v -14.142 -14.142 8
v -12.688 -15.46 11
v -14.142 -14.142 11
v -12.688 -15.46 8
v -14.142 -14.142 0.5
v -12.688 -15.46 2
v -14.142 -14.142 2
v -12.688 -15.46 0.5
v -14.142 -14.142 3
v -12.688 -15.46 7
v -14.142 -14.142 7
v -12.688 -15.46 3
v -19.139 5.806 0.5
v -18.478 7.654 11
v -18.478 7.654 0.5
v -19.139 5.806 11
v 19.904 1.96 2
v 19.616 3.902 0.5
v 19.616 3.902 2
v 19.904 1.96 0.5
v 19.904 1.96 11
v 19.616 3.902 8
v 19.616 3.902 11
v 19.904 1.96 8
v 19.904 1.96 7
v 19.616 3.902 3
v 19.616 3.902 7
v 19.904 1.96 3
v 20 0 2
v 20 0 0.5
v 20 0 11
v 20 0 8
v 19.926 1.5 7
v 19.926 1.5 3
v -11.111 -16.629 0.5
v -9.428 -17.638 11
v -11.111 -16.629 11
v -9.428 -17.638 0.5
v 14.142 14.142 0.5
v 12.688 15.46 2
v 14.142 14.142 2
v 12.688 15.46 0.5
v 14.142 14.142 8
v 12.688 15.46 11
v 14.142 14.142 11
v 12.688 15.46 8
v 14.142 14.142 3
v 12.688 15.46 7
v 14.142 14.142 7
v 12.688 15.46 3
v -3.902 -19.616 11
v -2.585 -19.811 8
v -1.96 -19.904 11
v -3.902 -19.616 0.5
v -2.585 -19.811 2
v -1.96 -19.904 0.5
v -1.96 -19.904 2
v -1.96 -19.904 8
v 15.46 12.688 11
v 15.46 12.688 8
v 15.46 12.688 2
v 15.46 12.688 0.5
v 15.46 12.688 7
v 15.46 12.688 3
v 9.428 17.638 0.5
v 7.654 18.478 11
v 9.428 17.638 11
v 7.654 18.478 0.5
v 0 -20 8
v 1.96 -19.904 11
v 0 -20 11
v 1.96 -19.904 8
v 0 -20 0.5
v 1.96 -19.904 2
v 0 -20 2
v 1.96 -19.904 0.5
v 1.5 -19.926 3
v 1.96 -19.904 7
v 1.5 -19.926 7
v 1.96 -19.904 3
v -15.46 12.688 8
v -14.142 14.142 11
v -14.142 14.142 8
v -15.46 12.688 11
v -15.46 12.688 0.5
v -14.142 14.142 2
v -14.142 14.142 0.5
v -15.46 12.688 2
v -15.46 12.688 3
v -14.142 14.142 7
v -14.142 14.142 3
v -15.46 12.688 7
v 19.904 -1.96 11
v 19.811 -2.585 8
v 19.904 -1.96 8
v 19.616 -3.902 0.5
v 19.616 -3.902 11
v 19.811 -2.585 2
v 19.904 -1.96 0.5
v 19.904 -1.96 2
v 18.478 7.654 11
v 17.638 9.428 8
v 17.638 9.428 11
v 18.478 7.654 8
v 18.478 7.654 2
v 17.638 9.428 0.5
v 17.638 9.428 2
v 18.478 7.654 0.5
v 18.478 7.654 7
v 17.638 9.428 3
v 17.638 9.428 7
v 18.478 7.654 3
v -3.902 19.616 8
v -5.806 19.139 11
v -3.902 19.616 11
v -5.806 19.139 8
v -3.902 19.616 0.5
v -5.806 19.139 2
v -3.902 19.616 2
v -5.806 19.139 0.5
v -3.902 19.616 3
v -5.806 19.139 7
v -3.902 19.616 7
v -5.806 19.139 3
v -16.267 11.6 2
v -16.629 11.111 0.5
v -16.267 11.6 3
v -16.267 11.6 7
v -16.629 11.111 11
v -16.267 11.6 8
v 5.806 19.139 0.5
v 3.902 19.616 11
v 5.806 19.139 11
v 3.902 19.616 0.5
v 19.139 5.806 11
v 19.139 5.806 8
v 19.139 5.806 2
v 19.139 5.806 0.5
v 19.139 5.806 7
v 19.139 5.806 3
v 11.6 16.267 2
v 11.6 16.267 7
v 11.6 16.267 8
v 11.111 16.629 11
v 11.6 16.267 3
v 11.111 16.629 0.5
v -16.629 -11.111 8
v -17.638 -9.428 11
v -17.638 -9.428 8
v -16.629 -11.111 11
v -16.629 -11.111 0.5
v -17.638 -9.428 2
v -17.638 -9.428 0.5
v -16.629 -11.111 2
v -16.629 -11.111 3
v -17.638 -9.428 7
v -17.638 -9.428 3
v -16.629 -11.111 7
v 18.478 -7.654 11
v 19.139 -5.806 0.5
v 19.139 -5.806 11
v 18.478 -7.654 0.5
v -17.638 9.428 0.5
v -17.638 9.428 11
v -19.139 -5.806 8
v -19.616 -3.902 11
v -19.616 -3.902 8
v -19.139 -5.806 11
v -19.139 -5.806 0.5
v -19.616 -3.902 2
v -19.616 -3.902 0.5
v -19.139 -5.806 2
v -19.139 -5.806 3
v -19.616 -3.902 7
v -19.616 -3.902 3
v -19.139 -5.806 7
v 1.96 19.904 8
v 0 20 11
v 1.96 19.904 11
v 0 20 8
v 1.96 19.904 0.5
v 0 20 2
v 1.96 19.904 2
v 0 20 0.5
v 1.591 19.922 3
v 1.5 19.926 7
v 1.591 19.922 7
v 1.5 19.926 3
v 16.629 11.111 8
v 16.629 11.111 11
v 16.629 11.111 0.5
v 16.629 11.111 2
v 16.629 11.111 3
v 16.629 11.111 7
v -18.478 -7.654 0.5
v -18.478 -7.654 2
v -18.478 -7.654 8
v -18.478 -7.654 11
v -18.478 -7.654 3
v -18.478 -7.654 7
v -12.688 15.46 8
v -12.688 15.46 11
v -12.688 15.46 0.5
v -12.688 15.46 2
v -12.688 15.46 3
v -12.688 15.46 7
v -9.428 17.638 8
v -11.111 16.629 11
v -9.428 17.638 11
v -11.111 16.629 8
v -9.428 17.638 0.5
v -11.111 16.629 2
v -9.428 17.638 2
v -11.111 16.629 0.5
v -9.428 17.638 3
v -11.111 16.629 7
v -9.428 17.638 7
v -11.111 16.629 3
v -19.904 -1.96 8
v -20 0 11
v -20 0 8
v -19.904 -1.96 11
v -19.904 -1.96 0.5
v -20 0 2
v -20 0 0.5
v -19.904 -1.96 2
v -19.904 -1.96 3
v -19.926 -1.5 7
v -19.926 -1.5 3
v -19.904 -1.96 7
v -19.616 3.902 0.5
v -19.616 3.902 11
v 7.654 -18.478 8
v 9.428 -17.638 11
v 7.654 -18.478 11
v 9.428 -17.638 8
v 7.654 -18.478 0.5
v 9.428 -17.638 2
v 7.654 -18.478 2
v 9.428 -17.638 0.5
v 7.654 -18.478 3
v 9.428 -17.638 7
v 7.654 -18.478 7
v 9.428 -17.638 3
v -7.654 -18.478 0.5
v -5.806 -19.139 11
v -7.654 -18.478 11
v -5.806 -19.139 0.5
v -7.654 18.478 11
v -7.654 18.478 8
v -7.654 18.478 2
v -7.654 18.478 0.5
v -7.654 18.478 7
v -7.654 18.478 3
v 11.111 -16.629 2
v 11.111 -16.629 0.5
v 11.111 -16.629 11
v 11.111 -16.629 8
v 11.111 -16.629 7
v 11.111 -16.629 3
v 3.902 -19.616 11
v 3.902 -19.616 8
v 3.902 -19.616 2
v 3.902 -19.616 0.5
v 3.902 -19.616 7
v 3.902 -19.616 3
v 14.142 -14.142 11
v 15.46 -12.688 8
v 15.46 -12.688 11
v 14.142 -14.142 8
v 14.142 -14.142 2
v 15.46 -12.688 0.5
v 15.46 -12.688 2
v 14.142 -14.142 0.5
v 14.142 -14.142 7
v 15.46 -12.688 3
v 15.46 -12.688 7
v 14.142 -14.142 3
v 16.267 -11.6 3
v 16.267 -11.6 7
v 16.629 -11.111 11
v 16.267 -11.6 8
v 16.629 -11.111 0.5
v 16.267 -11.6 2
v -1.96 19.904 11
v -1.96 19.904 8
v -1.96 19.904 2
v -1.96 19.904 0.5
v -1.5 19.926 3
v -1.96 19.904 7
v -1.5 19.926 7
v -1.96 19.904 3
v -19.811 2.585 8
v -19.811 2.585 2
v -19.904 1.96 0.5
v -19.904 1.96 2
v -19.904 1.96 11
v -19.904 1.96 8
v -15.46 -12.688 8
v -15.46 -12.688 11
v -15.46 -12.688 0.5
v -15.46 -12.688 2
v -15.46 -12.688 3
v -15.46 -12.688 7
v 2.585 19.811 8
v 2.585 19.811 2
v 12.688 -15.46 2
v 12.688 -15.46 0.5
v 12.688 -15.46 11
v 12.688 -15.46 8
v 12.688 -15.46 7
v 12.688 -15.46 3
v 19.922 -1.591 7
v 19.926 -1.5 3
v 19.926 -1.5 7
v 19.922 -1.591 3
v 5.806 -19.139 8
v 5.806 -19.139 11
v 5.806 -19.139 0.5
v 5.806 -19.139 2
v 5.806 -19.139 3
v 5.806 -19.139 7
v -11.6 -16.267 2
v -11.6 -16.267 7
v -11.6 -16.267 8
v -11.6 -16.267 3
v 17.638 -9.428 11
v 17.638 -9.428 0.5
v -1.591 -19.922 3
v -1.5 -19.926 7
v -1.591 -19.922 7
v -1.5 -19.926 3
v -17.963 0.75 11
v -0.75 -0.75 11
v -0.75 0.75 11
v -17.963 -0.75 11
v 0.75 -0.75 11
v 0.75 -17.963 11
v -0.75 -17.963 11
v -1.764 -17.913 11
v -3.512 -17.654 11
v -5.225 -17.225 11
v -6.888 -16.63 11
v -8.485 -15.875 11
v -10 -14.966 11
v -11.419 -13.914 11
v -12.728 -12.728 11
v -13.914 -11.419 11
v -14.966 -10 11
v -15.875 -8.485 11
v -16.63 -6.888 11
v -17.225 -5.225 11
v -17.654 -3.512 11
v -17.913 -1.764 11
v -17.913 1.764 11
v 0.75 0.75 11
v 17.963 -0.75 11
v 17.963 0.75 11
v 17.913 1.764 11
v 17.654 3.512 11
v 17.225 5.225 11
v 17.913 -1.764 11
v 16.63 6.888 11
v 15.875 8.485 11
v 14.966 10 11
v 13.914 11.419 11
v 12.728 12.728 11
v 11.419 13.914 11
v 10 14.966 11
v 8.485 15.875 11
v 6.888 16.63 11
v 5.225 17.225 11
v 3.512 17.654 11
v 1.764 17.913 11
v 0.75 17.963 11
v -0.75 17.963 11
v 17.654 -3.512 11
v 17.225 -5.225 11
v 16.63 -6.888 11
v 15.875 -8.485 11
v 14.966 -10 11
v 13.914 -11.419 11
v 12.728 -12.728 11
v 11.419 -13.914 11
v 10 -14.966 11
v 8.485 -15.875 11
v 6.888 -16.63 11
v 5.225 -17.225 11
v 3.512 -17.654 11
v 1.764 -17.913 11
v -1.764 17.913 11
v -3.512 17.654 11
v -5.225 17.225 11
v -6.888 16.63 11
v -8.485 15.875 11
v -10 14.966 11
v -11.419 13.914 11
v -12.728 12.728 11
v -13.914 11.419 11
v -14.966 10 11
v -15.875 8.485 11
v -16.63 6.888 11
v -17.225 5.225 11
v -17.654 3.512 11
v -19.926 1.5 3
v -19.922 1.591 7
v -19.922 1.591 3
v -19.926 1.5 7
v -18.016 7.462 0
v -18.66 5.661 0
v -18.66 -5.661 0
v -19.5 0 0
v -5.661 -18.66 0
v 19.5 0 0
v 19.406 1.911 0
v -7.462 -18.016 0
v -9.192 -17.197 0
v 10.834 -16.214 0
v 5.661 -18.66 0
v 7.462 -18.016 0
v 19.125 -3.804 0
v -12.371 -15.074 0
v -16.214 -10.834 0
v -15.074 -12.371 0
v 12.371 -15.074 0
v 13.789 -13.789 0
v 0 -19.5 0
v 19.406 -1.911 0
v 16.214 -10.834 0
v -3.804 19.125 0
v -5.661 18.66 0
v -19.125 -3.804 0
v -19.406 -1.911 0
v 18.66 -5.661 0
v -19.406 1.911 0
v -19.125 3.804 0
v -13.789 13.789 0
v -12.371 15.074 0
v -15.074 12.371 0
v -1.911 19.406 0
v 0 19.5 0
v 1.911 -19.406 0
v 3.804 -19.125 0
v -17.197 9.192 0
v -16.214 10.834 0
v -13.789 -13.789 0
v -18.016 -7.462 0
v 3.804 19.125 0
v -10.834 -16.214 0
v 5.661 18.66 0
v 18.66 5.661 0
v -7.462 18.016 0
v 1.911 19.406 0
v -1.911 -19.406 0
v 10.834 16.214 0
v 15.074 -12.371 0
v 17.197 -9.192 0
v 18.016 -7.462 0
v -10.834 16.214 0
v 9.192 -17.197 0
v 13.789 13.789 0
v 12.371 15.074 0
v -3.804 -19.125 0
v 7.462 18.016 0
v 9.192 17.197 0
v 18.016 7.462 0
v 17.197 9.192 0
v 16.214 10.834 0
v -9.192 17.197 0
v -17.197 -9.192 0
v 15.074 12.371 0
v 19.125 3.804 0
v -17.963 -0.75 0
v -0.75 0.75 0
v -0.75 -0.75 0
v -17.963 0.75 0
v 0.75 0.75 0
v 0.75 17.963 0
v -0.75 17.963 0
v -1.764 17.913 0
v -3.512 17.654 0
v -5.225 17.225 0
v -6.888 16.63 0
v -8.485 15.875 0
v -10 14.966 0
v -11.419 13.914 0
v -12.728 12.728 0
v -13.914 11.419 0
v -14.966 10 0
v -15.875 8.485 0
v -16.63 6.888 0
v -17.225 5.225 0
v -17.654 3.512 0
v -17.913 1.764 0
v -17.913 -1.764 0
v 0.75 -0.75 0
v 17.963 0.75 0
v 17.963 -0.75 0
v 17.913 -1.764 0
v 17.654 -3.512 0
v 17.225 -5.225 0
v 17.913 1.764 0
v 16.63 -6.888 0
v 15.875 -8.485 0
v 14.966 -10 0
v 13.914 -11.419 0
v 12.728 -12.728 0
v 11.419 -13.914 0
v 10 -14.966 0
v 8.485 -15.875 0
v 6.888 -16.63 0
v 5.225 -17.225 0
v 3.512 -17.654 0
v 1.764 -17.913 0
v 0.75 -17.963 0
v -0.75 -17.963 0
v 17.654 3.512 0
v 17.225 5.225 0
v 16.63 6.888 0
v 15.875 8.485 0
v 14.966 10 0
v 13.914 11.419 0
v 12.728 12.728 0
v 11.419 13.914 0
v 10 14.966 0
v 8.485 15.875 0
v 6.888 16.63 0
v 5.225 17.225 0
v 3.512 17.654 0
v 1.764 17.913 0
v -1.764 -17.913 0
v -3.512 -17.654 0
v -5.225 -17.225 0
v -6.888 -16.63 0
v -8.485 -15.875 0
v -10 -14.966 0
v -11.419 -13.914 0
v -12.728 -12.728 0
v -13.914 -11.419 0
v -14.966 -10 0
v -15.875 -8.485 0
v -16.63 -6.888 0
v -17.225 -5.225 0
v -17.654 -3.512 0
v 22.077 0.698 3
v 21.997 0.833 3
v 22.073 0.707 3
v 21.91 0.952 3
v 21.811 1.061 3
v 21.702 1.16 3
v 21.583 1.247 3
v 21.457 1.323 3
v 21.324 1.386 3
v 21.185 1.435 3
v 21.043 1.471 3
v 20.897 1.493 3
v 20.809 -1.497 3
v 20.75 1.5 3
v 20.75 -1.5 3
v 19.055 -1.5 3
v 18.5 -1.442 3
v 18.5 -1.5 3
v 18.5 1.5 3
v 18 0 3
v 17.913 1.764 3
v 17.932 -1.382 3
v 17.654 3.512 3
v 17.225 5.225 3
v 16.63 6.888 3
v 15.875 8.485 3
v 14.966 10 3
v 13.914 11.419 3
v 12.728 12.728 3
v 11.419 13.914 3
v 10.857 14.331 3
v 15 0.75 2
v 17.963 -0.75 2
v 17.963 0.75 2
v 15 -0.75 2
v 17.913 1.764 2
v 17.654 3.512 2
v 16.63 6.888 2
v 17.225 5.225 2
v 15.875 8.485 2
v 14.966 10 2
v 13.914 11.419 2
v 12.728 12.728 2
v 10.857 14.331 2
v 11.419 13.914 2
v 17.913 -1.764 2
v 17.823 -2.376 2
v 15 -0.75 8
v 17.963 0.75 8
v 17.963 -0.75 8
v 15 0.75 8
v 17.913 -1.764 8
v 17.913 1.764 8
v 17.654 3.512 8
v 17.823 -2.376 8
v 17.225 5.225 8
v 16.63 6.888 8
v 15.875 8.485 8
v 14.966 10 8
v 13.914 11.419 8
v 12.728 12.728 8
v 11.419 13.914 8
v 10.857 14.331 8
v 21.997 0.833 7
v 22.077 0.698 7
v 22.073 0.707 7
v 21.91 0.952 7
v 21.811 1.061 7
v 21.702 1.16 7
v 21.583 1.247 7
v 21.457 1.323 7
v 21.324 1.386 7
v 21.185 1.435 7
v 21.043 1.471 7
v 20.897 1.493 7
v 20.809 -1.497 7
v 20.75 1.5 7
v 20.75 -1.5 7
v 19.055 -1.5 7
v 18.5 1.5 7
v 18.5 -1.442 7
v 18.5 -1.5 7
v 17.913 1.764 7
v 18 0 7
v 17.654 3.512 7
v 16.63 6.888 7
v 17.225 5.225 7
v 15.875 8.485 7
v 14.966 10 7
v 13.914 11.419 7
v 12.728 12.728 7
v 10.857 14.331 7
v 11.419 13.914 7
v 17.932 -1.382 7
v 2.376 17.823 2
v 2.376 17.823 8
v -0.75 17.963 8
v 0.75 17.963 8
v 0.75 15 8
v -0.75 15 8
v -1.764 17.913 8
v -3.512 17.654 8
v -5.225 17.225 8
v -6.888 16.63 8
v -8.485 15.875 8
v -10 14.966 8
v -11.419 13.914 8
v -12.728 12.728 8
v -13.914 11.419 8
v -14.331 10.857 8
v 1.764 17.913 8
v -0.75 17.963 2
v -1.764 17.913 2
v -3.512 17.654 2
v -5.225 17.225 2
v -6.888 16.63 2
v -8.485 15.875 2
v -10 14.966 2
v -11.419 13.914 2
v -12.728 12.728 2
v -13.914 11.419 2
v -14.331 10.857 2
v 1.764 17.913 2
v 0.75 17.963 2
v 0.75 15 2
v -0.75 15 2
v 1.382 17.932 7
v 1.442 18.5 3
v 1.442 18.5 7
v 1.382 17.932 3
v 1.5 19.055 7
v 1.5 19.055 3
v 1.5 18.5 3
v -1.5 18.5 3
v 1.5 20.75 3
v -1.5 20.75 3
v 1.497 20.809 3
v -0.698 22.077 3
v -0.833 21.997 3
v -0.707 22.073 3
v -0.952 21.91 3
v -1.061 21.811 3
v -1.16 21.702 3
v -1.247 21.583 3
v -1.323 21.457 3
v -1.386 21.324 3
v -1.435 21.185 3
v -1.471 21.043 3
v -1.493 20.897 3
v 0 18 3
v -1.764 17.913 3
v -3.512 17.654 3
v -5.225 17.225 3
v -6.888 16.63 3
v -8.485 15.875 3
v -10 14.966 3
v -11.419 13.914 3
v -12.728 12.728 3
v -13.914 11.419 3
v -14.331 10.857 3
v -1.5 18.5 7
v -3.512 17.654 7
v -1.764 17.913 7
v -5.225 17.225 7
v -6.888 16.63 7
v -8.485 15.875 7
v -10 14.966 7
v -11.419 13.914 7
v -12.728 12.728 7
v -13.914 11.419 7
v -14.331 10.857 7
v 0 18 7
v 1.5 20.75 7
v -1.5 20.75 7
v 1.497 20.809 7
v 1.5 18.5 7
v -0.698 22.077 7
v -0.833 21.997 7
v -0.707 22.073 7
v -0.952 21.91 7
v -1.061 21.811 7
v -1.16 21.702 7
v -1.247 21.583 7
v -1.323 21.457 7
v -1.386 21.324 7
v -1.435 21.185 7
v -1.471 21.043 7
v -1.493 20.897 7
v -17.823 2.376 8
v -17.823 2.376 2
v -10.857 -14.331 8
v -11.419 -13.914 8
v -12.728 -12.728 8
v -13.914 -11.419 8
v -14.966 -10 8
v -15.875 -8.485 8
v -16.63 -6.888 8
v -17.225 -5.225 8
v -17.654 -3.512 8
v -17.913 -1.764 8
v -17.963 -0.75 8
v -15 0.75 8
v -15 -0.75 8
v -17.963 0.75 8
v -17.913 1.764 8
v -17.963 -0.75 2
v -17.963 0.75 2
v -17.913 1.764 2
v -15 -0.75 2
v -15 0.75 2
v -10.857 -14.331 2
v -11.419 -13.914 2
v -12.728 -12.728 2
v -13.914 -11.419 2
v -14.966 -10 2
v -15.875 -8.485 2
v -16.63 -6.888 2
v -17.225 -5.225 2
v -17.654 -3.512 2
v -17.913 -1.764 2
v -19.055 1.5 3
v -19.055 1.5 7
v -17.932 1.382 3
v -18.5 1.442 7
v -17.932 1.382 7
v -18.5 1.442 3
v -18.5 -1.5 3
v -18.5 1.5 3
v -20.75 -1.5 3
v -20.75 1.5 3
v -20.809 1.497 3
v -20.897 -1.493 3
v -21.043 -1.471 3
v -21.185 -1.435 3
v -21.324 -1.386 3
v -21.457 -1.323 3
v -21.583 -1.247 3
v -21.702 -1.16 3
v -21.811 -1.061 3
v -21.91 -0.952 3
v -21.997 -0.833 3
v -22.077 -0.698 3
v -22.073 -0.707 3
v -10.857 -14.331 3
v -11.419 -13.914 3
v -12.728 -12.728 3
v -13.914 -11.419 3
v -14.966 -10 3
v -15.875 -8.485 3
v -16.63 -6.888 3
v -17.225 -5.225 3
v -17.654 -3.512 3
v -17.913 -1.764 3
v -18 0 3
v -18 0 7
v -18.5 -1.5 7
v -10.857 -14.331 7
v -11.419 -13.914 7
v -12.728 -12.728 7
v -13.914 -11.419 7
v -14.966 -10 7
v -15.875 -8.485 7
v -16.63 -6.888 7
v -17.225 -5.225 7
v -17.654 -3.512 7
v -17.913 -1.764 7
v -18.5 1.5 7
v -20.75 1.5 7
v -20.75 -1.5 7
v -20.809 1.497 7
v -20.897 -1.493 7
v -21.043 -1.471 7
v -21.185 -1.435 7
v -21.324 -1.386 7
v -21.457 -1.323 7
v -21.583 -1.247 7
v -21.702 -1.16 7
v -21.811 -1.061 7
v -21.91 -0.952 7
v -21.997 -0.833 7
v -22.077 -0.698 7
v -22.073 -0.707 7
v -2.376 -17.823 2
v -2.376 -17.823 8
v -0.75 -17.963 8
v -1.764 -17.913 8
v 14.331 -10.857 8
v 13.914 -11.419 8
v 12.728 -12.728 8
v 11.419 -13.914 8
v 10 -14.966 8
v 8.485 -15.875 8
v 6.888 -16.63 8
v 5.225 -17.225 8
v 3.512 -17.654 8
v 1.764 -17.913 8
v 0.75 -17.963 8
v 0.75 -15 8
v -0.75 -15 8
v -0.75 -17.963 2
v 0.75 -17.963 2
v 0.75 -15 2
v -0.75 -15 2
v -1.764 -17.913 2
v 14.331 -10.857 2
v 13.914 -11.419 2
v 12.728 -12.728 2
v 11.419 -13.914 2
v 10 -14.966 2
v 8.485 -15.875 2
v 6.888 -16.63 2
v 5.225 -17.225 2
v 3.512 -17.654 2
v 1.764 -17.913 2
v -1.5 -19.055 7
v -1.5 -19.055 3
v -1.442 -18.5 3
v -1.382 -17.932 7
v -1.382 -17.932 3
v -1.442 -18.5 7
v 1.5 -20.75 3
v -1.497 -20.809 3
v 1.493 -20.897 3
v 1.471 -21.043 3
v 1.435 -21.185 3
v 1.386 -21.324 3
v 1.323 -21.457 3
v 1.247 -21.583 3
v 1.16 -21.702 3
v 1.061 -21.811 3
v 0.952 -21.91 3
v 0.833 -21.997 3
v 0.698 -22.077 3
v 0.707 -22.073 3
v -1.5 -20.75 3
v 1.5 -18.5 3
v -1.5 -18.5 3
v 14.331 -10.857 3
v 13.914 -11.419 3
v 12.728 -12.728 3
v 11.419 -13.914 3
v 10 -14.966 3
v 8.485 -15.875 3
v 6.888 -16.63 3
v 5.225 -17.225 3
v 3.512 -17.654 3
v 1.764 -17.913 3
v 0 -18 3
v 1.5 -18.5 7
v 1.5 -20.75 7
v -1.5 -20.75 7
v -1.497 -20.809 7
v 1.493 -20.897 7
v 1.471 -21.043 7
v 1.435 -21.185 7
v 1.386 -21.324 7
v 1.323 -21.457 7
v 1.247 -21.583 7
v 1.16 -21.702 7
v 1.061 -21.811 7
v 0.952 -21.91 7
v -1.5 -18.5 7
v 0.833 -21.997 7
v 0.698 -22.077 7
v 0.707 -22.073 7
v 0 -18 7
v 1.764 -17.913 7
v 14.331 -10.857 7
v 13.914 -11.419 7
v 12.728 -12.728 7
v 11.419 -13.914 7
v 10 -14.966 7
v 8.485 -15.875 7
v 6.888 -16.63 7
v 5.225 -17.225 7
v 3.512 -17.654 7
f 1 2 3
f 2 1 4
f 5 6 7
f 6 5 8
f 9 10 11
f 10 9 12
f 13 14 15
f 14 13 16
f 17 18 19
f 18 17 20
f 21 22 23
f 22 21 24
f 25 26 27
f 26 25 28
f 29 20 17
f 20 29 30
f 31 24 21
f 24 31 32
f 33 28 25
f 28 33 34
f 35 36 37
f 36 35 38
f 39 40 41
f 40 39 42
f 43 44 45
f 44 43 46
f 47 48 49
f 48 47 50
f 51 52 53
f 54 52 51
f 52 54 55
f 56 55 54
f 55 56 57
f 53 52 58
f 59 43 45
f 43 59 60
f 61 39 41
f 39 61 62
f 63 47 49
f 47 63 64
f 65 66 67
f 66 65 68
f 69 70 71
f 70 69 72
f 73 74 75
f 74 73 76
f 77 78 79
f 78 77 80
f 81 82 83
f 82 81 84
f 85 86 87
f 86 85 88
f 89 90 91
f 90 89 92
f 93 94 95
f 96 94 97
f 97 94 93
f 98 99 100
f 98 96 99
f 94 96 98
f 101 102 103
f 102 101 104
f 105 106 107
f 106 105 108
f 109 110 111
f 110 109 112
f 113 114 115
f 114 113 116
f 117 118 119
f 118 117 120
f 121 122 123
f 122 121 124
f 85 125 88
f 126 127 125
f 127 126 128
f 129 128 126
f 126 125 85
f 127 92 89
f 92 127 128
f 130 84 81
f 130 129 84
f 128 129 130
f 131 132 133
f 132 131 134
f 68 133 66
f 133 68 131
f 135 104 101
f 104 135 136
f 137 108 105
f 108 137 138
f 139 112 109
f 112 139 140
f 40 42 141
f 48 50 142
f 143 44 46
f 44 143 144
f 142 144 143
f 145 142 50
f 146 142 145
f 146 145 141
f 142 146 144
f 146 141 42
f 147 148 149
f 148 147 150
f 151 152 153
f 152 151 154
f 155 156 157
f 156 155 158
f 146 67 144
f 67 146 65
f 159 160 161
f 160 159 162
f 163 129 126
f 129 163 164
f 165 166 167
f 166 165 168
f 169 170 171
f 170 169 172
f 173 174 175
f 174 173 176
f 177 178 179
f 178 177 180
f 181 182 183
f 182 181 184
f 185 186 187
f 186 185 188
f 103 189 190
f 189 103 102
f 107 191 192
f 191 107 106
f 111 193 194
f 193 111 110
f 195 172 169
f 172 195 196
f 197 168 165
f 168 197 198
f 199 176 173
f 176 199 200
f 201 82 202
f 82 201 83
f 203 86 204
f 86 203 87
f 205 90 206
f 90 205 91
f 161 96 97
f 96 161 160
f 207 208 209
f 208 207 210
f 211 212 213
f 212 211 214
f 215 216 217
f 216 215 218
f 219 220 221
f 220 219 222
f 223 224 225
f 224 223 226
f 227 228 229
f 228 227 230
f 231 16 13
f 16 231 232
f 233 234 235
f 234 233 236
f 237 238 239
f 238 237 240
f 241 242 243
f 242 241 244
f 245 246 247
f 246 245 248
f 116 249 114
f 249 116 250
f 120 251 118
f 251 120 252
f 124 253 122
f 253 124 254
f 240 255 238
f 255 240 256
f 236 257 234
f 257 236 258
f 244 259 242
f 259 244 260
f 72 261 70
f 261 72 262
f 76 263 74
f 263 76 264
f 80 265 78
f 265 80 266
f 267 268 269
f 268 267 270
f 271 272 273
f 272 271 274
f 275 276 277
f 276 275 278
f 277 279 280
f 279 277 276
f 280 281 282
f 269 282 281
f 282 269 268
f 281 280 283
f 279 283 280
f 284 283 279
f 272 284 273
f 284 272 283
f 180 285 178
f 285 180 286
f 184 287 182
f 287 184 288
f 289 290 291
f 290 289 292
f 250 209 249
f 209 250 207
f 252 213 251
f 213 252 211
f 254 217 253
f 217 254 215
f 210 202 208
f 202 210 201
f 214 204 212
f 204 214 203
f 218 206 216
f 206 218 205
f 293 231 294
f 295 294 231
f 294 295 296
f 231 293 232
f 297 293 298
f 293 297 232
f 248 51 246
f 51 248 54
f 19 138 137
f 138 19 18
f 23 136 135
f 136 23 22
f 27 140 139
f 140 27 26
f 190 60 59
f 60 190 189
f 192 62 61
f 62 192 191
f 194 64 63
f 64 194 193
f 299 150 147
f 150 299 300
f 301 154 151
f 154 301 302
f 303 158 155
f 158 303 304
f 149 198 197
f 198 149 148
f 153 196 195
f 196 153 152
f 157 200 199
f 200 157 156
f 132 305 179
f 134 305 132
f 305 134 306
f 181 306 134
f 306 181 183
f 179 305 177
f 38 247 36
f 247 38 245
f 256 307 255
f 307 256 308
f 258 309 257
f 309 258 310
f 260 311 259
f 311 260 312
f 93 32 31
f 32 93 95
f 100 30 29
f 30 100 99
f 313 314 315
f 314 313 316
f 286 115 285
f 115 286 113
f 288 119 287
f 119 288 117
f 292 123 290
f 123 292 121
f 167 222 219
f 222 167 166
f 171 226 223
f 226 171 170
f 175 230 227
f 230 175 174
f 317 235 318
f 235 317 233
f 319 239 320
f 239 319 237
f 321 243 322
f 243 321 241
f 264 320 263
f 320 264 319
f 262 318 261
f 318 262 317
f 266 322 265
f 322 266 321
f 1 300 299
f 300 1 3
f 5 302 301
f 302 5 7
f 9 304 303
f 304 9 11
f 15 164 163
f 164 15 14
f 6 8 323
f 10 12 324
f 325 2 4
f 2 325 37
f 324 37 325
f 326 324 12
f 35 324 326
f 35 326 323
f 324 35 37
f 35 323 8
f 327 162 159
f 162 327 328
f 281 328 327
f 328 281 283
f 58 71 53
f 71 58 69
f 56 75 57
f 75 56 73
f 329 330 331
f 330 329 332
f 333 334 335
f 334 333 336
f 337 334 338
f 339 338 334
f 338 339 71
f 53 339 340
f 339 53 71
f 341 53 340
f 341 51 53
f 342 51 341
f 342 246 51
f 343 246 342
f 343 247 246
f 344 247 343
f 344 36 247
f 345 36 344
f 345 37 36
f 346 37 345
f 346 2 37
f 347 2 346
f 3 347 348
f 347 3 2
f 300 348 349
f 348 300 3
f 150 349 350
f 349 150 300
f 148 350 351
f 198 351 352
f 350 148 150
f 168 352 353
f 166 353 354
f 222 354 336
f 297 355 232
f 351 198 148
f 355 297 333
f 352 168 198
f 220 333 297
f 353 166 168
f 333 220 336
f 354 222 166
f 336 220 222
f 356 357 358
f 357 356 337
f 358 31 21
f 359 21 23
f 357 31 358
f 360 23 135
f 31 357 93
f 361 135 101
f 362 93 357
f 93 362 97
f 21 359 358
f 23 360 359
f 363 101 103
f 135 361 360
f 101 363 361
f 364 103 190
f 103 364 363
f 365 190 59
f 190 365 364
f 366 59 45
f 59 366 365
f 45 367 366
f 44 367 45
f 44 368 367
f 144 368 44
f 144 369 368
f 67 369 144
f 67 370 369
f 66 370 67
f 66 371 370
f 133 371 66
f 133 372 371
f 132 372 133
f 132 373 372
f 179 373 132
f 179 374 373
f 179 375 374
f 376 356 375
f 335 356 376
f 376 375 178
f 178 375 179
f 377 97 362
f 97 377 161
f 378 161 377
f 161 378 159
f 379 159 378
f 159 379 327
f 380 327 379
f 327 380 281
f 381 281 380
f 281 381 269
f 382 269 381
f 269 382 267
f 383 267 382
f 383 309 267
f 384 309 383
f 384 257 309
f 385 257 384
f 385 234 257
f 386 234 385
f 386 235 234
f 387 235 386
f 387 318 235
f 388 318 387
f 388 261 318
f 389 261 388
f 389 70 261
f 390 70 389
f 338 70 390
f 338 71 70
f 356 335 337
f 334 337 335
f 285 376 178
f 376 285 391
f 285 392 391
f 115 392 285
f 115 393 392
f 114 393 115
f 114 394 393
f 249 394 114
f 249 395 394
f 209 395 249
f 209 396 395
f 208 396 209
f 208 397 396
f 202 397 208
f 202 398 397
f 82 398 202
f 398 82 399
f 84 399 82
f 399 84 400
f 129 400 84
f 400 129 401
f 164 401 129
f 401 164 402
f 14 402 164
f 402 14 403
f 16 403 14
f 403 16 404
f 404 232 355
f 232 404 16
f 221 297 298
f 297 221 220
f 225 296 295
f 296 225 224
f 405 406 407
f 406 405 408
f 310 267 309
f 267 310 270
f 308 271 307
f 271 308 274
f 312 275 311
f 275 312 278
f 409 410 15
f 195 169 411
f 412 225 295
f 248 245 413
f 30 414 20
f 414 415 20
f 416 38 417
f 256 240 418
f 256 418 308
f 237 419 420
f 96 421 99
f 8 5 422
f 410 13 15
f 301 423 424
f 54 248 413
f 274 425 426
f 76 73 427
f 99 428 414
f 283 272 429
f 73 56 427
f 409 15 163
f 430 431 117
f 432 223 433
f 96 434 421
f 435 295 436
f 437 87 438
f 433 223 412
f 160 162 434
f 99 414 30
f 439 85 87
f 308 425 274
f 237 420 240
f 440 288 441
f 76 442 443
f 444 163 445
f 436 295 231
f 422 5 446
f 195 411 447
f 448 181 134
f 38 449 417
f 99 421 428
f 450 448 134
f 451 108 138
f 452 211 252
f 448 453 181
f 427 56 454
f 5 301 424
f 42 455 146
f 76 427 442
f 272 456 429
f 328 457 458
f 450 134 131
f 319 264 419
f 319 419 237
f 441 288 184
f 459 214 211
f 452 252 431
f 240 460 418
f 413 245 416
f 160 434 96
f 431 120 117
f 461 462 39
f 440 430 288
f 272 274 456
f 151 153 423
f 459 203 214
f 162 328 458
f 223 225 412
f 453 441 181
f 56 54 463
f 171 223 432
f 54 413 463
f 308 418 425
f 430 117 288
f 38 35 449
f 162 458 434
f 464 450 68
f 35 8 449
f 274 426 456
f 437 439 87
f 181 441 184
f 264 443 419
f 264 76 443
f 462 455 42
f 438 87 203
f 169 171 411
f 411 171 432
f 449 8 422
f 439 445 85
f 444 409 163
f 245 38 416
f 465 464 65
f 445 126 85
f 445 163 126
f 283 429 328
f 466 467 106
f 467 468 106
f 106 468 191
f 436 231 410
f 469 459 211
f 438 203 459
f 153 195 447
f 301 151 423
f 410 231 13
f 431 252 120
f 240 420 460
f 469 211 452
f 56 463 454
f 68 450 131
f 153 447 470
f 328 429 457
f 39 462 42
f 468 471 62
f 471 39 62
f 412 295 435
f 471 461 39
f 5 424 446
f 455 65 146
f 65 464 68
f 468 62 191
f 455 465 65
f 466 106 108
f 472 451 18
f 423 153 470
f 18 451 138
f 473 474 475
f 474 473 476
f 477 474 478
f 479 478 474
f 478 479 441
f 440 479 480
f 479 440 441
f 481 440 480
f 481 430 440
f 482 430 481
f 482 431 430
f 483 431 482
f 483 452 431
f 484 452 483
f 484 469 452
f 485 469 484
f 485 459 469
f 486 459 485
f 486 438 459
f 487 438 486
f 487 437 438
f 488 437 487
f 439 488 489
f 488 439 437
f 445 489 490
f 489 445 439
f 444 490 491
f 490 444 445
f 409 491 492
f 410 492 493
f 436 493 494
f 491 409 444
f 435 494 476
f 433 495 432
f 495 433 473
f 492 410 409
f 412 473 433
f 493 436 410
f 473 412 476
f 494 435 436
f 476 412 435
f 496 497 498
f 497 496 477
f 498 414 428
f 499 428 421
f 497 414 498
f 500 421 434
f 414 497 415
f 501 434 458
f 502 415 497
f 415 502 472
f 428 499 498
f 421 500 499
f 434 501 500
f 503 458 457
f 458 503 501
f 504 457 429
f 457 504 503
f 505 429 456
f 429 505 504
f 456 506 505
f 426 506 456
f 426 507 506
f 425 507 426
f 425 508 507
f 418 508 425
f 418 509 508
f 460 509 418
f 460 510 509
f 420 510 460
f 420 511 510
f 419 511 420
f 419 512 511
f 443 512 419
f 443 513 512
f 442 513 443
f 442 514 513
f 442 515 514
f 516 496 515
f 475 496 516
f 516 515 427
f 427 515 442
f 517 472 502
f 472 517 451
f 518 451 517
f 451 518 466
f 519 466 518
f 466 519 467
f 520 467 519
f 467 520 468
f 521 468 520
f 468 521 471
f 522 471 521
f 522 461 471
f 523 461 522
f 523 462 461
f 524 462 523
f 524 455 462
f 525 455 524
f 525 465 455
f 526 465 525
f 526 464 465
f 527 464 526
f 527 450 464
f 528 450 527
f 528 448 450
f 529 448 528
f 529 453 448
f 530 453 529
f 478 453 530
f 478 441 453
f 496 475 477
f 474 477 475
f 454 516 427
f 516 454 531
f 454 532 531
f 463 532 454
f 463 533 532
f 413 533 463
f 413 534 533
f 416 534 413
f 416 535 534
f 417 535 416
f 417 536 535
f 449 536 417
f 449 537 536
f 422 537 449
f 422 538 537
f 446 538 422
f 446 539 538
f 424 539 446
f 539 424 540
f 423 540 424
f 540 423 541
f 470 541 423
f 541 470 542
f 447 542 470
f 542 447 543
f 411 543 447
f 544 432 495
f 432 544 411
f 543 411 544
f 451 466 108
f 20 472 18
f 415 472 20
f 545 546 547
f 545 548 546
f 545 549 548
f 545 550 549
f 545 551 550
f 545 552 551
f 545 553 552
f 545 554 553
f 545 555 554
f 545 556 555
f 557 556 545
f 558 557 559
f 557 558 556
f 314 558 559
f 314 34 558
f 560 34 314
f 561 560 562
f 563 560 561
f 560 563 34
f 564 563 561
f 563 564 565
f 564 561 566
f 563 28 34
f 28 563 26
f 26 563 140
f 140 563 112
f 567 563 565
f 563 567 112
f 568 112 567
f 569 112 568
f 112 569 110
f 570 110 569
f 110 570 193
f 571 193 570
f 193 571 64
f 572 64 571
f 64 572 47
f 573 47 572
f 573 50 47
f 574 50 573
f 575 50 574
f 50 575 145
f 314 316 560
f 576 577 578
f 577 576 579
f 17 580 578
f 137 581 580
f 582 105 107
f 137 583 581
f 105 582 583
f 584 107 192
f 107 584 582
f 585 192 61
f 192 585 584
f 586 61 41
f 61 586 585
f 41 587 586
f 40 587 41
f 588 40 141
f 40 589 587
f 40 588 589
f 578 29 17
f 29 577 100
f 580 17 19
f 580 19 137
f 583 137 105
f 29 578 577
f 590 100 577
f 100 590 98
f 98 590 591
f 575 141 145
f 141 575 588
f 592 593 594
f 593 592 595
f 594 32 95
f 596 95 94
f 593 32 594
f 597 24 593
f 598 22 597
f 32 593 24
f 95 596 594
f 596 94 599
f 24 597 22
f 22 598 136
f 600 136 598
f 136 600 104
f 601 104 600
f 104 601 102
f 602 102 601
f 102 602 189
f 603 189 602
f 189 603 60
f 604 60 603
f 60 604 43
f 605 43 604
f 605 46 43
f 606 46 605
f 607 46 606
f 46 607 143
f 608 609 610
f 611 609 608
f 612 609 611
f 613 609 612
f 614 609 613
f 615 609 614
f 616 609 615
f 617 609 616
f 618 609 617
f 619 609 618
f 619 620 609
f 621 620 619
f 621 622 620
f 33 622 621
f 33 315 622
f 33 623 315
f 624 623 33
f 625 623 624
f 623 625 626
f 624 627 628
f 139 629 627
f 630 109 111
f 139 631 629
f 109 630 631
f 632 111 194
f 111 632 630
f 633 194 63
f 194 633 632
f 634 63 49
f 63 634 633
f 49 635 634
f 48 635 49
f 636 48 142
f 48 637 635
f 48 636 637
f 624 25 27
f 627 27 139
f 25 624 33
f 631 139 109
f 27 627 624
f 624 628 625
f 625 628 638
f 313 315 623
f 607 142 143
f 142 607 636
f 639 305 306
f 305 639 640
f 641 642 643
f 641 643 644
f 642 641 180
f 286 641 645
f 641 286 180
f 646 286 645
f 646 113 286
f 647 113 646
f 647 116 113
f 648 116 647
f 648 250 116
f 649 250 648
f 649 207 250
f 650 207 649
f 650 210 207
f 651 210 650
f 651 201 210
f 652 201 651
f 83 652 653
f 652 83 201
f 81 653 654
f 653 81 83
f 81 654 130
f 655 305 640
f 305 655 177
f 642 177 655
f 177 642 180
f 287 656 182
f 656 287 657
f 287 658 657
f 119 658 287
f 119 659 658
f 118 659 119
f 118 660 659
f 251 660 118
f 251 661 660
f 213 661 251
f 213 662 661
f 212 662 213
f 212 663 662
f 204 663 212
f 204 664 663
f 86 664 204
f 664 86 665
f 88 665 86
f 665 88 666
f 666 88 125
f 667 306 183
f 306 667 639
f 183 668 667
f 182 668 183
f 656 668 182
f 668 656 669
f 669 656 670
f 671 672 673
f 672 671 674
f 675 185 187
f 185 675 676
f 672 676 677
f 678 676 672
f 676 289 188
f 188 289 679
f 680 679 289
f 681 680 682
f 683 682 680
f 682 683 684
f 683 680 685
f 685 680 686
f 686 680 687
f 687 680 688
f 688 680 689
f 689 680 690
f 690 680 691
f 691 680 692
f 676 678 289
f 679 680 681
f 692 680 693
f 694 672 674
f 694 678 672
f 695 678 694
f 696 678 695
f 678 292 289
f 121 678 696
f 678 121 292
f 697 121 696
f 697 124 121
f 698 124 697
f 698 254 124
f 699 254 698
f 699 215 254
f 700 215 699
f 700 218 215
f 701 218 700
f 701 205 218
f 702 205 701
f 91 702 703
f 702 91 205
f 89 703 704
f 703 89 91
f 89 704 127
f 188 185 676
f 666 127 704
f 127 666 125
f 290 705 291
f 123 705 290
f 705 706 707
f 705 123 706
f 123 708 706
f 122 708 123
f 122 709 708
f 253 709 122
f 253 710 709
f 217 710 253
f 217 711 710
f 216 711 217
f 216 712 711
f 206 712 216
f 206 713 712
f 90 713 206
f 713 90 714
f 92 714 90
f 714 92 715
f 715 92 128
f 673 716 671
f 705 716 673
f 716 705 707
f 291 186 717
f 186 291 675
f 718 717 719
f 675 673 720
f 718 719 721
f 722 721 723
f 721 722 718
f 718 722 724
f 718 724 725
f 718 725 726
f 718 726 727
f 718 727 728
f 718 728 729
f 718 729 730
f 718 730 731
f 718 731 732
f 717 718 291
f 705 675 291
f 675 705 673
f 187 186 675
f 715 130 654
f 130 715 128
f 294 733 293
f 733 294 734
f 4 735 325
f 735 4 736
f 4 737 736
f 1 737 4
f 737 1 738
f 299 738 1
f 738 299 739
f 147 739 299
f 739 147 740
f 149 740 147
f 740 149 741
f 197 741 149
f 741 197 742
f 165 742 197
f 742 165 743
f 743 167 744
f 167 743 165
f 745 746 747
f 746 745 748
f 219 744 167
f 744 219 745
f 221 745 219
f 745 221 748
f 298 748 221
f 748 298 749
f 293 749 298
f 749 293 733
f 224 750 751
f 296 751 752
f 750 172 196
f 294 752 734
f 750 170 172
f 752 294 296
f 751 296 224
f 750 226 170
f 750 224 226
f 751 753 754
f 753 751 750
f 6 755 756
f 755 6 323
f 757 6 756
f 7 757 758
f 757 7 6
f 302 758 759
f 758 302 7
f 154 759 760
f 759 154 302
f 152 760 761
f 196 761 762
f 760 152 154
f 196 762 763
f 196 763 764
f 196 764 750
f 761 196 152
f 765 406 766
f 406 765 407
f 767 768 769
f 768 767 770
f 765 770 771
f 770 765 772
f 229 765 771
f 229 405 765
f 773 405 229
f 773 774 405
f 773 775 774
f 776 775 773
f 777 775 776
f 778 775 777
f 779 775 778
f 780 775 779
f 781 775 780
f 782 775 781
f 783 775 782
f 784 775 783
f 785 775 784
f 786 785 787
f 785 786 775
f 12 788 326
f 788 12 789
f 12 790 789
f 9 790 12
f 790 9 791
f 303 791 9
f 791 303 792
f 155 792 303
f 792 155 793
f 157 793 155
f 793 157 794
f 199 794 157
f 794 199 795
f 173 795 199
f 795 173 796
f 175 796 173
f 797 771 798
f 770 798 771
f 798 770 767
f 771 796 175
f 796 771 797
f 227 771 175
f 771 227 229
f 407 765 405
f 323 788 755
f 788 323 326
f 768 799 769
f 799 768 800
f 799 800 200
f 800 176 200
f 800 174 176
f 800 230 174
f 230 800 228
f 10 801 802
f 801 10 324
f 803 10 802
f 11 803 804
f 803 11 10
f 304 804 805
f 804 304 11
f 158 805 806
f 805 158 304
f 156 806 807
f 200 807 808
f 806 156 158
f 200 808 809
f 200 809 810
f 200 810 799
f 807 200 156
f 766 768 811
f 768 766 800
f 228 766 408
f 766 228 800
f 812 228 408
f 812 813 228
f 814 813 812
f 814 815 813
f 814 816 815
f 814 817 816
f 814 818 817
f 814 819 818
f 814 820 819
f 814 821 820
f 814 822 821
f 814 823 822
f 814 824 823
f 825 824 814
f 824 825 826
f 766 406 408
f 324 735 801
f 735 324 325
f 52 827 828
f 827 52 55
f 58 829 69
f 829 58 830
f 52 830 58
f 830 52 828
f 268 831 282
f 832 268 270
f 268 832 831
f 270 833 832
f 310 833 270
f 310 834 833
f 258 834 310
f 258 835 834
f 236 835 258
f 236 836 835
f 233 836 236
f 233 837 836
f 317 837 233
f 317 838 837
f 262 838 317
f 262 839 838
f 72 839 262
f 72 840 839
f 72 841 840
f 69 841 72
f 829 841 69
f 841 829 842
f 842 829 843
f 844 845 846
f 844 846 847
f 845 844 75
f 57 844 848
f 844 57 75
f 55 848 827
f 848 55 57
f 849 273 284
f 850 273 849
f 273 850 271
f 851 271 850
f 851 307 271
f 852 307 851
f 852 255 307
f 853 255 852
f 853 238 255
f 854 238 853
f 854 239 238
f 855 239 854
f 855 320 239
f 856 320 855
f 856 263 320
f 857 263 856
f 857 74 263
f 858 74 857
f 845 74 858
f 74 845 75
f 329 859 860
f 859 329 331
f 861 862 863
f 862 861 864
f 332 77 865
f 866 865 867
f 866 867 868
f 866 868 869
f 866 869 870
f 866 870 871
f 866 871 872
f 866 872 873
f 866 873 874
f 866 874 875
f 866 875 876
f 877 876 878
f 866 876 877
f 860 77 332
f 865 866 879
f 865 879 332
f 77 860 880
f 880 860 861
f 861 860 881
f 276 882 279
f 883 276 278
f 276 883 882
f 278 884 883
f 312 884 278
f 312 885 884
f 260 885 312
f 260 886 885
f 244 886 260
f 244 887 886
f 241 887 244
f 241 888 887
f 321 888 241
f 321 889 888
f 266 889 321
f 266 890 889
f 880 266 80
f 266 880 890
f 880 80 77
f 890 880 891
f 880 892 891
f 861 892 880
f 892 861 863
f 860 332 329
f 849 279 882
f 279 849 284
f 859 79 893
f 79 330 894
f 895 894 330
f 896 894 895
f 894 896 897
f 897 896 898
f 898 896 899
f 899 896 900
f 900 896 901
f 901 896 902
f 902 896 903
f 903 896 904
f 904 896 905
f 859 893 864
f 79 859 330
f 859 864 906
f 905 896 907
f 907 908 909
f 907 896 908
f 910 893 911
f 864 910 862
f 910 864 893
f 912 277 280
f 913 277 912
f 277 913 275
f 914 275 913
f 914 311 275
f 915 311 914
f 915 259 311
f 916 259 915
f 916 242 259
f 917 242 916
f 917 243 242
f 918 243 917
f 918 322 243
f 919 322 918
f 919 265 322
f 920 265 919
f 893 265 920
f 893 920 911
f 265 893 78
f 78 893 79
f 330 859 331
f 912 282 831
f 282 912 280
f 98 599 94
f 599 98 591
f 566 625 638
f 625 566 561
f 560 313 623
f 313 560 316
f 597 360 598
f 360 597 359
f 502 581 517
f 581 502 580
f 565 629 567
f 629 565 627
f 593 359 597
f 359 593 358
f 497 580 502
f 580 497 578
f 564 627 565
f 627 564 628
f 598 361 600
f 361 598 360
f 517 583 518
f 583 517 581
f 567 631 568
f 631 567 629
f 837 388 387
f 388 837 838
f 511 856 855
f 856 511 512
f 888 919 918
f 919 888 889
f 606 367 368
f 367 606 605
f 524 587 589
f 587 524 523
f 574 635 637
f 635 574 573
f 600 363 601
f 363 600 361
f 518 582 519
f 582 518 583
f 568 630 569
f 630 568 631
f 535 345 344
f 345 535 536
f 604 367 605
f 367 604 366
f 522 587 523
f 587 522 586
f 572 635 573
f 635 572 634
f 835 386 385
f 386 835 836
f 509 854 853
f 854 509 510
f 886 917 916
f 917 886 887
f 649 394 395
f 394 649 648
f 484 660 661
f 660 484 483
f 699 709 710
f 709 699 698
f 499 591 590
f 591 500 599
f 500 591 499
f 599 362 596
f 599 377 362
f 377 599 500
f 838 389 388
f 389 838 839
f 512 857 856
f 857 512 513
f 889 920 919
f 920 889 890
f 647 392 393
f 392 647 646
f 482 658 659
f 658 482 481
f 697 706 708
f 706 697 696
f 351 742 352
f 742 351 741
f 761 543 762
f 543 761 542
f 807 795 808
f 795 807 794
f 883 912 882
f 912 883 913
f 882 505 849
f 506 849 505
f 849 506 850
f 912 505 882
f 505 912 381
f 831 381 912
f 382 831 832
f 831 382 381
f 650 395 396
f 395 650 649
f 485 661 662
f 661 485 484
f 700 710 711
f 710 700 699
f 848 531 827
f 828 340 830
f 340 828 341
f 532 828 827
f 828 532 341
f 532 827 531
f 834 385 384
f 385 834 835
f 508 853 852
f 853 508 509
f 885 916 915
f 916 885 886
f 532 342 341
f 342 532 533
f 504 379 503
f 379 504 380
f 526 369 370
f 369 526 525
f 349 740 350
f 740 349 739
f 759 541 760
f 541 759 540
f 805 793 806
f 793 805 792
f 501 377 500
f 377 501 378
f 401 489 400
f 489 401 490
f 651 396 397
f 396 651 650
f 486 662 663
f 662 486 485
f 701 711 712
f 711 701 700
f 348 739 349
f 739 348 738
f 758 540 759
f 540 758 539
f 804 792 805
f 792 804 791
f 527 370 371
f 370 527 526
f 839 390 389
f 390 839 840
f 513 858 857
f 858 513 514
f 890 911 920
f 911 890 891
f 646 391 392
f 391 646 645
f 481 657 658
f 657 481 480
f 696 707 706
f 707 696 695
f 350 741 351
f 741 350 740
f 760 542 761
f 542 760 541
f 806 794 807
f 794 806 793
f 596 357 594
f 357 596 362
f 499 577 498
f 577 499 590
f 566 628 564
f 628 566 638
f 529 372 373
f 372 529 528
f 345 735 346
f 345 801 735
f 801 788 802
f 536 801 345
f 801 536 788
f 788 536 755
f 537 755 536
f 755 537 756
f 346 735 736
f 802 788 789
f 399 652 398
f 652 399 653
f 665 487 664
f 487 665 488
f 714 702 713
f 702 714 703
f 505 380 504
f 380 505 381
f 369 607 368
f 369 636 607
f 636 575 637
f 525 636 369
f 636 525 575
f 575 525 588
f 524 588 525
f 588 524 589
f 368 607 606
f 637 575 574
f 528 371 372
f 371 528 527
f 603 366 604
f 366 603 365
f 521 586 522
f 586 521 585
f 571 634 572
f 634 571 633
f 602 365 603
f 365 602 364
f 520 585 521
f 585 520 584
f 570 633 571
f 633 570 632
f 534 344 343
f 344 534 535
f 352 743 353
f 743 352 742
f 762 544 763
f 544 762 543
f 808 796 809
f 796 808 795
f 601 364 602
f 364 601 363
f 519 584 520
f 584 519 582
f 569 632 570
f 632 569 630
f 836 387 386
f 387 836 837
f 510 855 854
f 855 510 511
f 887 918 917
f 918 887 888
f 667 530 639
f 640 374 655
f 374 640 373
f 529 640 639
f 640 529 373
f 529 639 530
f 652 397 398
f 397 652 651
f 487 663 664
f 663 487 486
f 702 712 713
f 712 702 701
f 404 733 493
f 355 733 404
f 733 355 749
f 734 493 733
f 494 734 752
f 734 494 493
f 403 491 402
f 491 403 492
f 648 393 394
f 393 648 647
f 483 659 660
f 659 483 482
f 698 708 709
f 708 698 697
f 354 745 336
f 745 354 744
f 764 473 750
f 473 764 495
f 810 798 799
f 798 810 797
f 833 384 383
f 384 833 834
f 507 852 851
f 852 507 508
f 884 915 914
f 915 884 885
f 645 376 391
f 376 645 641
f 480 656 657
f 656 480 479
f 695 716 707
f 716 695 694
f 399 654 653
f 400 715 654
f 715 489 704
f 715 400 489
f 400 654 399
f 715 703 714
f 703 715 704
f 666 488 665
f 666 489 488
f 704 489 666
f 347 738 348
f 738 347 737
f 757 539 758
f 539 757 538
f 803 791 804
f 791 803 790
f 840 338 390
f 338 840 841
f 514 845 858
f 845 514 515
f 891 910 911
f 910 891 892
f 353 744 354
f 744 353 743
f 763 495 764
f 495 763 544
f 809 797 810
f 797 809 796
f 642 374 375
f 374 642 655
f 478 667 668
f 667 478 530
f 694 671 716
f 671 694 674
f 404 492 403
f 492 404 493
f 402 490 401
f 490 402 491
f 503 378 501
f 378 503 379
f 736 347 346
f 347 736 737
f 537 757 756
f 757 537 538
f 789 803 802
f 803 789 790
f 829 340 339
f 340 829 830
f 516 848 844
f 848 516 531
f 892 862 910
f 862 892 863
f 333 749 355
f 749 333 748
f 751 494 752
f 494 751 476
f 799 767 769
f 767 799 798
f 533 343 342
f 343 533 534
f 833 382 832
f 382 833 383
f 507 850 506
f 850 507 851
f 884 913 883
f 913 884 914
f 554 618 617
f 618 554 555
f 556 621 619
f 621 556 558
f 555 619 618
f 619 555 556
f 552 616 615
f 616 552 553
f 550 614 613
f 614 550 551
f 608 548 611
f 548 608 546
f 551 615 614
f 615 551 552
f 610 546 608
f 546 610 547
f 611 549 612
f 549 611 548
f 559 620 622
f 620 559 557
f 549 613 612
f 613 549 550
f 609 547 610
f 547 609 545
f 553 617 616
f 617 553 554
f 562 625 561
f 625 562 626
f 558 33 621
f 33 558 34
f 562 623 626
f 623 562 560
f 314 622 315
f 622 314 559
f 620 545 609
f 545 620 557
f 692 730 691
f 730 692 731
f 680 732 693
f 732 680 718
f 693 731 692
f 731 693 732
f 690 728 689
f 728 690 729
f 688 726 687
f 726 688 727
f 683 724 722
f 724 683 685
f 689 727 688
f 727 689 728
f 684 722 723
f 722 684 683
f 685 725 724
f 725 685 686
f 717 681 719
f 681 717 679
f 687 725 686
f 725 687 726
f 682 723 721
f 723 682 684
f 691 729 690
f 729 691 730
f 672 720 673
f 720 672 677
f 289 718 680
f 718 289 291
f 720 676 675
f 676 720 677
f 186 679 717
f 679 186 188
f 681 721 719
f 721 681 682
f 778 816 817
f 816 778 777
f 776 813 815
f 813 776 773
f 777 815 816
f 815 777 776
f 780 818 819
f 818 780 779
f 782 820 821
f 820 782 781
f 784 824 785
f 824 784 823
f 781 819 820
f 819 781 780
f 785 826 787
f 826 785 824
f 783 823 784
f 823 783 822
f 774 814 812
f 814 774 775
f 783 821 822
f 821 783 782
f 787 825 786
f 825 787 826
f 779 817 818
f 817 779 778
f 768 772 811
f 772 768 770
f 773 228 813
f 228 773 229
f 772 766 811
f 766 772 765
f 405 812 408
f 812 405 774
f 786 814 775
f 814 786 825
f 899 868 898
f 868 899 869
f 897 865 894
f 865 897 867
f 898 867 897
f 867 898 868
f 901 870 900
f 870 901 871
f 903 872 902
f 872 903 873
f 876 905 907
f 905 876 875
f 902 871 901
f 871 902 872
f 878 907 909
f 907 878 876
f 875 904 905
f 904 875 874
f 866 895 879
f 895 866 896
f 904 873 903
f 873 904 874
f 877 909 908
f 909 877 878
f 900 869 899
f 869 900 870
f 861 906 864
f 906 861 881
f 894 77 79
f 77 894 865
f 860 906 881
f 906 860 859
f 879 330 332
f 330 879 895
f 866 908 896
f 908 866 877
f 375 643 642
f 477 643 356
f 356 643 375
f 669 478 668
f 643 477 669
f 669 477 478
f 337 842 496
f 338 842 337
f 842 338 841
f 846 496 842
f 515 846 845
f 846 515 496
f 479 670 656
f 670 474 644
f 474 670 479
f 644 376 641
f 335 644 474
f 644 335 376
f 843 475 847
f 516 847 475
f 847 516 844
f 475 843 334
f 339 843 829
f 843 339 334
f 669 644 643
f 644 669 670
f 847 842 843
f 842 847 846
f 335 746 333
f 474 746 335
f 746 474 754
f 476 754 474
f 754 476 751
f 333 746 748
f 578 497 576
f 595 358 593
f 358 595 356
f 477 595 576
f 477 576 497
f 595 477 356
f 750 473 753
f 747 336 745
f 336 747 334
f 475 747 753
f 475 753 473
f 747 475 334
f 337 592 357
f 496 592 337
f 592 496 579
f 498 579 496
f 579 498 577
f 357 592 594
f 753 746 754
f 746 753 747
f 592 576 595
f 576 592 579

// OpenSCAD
$fn=64;

rotatorInside();

module rotatorInside() {
  rt = 2;
  h = 11;
  or = 20;
  ir = or-rt;

  ring(or,ir,h);
  pip(or);
  rotate([0,0,90]) pip(or);
  rotate([0,0,180]) pip(or);
  rotate([0,0,270]) pip(or);

  bar();
  rotate([0,0,90]) bar();


}

module cut(or) {
  translate([0,0,2]) {
    rotate([0,0,-21]) translate([5,5,0]) cube([or,or,1]);
    rotate([0,0,-21]) translate([5,5,5]) cube([or,or,1]);
    rotate([0,0,-6]) translate([-0.5,0,0]) cube([1,or,6]);
  }
}

module ring(or,ir,h) {
  difference() {
    union() { 
      translate([0,0,0.5]) cylinder(r=or, h=h-0.5);
      cylinder(r1=or-0.5, r2=or,h=0.5);
    }
    translate([0,0,-0.05]) cylinder(r=ir, h=h+0.1);

    cut(or);
    rotate([0,0,90]) cut(or);
    rotate([0,0,180]) cut(or);
    rotate([0,0,270]) cut(or);
  }
}

module pip(or) {
  translate([or+0.75,0,3]) {
    difference() {
      union() {
        cylinder(r=1.5,h=4);
        translate([-2.25,-1.5,0]) cube([2.25,3,4]);
      }
      rotate([0,0,60]) translate([-1.5,-3.8,-0.5]) cube([3,3,5]);
    }
  }
}

module bar() {
  holew=4;
  difference() {
    translate([-1.5/2,-38/2,0]) cube([1.5,38,11]);
    translate([-1,15,2]) cube([2,holew,6]);
    translate([-1,-15-holew,2]) cube([2,holew,6]);
  }
}
